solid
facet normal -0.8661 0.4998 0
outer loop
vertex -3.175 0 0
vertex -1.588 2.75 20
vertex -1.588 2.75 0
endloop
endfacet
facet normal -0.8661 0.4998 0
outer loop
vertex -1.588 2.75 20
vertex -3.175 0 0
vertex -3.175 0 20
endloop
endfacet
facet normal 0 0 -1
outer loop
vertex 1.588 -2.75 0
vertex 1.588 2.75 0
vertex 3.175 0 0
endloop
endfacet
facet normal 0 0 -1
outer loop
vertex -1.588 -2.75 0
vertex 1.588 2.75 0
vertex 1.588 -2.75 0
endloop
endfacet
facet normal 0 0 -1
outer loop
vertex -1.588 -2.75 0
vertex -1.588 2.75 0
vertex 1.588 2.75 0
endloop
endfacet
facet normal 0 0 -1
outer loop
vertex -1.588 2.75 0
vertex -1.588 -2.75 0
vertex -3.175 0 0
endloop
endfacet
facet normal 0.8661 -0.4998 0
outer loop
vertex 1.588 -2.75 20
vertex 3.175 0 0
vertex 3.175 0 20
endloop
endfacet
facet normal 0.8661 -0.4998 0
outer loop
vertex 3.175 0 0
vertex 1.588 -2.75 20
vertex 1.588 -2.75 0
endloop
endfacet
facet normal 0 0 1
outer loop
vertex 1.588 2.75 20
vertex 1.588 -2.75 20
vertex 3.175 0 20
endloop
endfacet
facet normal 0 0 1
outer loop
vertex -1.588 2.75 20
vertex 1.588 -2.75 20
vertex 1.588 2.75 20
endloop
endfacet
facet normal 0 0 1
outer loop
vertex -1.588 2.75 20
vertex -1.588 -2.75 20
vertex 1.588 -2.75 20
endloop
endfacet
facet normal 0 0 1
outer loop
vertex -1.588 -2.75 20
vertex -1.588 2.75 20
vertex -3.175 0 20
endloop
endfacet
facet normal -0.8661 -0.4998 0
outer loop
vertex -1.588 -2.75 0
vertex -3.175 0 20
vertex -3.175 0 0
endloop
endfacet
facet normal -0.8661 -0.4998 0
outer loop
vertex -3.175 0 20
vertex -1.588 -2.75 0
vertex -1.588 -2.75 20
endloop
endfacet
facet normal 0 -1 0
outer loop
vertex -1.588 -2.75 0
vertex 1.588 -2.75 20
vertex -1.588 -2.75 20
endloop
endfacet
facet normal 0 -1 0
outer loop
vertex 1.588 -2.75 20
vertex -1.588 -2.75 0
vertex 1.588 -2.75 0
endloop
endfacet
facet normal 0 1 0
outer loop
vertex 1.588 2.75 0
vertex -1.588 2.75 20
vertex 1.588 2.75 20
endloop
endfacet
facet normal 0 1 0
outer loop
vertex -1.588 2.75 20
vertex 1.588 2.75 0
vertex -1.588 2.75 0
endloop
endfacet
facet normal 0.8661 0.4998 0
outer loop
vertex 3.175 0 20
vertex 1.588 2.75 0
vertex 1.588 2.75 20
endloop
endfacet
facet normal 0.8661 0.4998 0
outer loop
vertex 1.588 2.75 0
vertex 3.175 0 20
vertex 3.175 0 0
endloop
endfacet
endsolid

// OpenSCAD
// file: ../config.scad
// SCARA 로봇 공통 사양(specification) — 모든 부품 파일에서 include해 사용한다.

$fn = 48;

// ── 공차(tolerance) ──
print_clearance = 0.2;   // FDM 출력 끼워맞춤(fit) 여유 — 압입(press-fit) 자리 제외
eps             = 1/128; // 미세 겹침(epsilon) — 접하는 솔리드를 살짝 겹쳐 동일면(coincident face) z-파이팅 방지

// ── FDM 출력 사양(print specification) ──
fdm_layer_h       = 0.28;   // 레이어 높이(layer height) — 슬라이서(slicer) 설정값과 일치시킨다.
fdm_shoulder_layers = 6;   // 숄더(shoulder) 최소 레이어 수 — FDM 최소 구조 벽(0.4mm 노즐 3겹 ~1.2mm) 기준 하한값.

// ── 레이아웃(layout) ──
// layout_margin — 플레이트 위 부품 배치 공통 여백(margin). 부품 외곽선에서
// 사방으로 주는 값 → 부품끼리는 2*margin 이격, 외곽 가장자리도 margin 확보.
layout_margin = 4;

// ── 시트 형상(seat geometry) ──
// seat_shoulder_t — fdm_layer_h · fdm_shoulder_layers 파생. 슬라이서 설정 변경 시 자동 연동.
seat_shoulder_t = fdm_layer_h * fdm_shoulder_layers;
// main file
/*
 * standoffs.scad - 육각 스탠드오프(hex standoff) 기성품(vitamin)
 *
 * PCB·플레이트 사이 간격 유지(spacer)와 체결(fastening)에 쓰는 황동
 * (brass) 암-암(female-female) 육각 스탠드오프. 맞변거리(across-flats)
 * 기준 정육각형(regular hexagon) 몸체로 모델링한다.
 *
 * Z 브레이크포인트(Z breakpoint) 최적화: 몸체는 비회전(non-round)
 * 정육각형이라 단면을 linear_extrude로 한 번에 쌓는다. 보어(bore)는
 * difference로 깎지 않고 — rotate_extrude 솔리드를 깎으면 미리보기(F5)에
 * 안 보일 수 있어 — 양 끝에 어두운 디스크(dark disk) 마커로 표시한다.
 *
 * 좌표계: 축(axis) = Z, 스탠드오프 바닥 = z=0. z=0..length.
 */

include <../config.scad>

/* --- 형상 비율(cosmetic) --- */
bore_ratio	= 0.62;	/* 보어 마커 지름 = 맞변거리(af) 대비 비율 */
marker_t	= 0.4;	/* 보어 마커 디스크(disk) 두께 */

/* --- 색상(cosmetic) --- */
c_brass		= [0.78, 0.62, 0.28];	/* 황동(brass) 몸체 */
c_bore		= [0.12, 0.10, 0.05];	/* 보어(bore) 음각 마커 */

/* 맞변거리(across-flats) af → 외접원 반지름(circumradius). */
function hex_circumradius(af) = af / sqrt(3);

/*
 * 육각 스탠드오프 — 맞변거리(af)와 길이(length)를 받는다. 정육각형
 * 단면을 linear_extrude로 쌓아 몸체를 만들고, 보어(bore)는 양 끝
 * 어두운 디스크로 표시한다(boolean 없음).
 */
module hex_standoff(af, length)
{
	cr  = hex_circumradius(af);	/* 정육각형 외접원 반지름 */
	mr  = af * bore_ratio / 2;	/* 보어 마커 반지름 */

	/* 육각 몸체 — 맞변거리(af) 기준 정육각형을 전길이로 압출 */
	color(c_brass)
		linear_extrude(height = length)
			circle(r = cr, $fn = 6);

	/* 보어(bore) 마커 — 양 끝면에 어두운 디스크로 통공을 표현 */
	color(c_bore) {
		translate([0, 0, length - marker_t - eps])
			cylinder(h = marker_t, r = mr);
		translate([0, 0, eps])
			cylinder(h = marker_t, r = mr);
	}
}

/* --- 표준 변형(convenience) — M3 황동 스탠드오프 --- */
module standoff_m3(length) { hex_standoff(5.5, length); }	/* AF 5.5 */

standoff_m3(20);
